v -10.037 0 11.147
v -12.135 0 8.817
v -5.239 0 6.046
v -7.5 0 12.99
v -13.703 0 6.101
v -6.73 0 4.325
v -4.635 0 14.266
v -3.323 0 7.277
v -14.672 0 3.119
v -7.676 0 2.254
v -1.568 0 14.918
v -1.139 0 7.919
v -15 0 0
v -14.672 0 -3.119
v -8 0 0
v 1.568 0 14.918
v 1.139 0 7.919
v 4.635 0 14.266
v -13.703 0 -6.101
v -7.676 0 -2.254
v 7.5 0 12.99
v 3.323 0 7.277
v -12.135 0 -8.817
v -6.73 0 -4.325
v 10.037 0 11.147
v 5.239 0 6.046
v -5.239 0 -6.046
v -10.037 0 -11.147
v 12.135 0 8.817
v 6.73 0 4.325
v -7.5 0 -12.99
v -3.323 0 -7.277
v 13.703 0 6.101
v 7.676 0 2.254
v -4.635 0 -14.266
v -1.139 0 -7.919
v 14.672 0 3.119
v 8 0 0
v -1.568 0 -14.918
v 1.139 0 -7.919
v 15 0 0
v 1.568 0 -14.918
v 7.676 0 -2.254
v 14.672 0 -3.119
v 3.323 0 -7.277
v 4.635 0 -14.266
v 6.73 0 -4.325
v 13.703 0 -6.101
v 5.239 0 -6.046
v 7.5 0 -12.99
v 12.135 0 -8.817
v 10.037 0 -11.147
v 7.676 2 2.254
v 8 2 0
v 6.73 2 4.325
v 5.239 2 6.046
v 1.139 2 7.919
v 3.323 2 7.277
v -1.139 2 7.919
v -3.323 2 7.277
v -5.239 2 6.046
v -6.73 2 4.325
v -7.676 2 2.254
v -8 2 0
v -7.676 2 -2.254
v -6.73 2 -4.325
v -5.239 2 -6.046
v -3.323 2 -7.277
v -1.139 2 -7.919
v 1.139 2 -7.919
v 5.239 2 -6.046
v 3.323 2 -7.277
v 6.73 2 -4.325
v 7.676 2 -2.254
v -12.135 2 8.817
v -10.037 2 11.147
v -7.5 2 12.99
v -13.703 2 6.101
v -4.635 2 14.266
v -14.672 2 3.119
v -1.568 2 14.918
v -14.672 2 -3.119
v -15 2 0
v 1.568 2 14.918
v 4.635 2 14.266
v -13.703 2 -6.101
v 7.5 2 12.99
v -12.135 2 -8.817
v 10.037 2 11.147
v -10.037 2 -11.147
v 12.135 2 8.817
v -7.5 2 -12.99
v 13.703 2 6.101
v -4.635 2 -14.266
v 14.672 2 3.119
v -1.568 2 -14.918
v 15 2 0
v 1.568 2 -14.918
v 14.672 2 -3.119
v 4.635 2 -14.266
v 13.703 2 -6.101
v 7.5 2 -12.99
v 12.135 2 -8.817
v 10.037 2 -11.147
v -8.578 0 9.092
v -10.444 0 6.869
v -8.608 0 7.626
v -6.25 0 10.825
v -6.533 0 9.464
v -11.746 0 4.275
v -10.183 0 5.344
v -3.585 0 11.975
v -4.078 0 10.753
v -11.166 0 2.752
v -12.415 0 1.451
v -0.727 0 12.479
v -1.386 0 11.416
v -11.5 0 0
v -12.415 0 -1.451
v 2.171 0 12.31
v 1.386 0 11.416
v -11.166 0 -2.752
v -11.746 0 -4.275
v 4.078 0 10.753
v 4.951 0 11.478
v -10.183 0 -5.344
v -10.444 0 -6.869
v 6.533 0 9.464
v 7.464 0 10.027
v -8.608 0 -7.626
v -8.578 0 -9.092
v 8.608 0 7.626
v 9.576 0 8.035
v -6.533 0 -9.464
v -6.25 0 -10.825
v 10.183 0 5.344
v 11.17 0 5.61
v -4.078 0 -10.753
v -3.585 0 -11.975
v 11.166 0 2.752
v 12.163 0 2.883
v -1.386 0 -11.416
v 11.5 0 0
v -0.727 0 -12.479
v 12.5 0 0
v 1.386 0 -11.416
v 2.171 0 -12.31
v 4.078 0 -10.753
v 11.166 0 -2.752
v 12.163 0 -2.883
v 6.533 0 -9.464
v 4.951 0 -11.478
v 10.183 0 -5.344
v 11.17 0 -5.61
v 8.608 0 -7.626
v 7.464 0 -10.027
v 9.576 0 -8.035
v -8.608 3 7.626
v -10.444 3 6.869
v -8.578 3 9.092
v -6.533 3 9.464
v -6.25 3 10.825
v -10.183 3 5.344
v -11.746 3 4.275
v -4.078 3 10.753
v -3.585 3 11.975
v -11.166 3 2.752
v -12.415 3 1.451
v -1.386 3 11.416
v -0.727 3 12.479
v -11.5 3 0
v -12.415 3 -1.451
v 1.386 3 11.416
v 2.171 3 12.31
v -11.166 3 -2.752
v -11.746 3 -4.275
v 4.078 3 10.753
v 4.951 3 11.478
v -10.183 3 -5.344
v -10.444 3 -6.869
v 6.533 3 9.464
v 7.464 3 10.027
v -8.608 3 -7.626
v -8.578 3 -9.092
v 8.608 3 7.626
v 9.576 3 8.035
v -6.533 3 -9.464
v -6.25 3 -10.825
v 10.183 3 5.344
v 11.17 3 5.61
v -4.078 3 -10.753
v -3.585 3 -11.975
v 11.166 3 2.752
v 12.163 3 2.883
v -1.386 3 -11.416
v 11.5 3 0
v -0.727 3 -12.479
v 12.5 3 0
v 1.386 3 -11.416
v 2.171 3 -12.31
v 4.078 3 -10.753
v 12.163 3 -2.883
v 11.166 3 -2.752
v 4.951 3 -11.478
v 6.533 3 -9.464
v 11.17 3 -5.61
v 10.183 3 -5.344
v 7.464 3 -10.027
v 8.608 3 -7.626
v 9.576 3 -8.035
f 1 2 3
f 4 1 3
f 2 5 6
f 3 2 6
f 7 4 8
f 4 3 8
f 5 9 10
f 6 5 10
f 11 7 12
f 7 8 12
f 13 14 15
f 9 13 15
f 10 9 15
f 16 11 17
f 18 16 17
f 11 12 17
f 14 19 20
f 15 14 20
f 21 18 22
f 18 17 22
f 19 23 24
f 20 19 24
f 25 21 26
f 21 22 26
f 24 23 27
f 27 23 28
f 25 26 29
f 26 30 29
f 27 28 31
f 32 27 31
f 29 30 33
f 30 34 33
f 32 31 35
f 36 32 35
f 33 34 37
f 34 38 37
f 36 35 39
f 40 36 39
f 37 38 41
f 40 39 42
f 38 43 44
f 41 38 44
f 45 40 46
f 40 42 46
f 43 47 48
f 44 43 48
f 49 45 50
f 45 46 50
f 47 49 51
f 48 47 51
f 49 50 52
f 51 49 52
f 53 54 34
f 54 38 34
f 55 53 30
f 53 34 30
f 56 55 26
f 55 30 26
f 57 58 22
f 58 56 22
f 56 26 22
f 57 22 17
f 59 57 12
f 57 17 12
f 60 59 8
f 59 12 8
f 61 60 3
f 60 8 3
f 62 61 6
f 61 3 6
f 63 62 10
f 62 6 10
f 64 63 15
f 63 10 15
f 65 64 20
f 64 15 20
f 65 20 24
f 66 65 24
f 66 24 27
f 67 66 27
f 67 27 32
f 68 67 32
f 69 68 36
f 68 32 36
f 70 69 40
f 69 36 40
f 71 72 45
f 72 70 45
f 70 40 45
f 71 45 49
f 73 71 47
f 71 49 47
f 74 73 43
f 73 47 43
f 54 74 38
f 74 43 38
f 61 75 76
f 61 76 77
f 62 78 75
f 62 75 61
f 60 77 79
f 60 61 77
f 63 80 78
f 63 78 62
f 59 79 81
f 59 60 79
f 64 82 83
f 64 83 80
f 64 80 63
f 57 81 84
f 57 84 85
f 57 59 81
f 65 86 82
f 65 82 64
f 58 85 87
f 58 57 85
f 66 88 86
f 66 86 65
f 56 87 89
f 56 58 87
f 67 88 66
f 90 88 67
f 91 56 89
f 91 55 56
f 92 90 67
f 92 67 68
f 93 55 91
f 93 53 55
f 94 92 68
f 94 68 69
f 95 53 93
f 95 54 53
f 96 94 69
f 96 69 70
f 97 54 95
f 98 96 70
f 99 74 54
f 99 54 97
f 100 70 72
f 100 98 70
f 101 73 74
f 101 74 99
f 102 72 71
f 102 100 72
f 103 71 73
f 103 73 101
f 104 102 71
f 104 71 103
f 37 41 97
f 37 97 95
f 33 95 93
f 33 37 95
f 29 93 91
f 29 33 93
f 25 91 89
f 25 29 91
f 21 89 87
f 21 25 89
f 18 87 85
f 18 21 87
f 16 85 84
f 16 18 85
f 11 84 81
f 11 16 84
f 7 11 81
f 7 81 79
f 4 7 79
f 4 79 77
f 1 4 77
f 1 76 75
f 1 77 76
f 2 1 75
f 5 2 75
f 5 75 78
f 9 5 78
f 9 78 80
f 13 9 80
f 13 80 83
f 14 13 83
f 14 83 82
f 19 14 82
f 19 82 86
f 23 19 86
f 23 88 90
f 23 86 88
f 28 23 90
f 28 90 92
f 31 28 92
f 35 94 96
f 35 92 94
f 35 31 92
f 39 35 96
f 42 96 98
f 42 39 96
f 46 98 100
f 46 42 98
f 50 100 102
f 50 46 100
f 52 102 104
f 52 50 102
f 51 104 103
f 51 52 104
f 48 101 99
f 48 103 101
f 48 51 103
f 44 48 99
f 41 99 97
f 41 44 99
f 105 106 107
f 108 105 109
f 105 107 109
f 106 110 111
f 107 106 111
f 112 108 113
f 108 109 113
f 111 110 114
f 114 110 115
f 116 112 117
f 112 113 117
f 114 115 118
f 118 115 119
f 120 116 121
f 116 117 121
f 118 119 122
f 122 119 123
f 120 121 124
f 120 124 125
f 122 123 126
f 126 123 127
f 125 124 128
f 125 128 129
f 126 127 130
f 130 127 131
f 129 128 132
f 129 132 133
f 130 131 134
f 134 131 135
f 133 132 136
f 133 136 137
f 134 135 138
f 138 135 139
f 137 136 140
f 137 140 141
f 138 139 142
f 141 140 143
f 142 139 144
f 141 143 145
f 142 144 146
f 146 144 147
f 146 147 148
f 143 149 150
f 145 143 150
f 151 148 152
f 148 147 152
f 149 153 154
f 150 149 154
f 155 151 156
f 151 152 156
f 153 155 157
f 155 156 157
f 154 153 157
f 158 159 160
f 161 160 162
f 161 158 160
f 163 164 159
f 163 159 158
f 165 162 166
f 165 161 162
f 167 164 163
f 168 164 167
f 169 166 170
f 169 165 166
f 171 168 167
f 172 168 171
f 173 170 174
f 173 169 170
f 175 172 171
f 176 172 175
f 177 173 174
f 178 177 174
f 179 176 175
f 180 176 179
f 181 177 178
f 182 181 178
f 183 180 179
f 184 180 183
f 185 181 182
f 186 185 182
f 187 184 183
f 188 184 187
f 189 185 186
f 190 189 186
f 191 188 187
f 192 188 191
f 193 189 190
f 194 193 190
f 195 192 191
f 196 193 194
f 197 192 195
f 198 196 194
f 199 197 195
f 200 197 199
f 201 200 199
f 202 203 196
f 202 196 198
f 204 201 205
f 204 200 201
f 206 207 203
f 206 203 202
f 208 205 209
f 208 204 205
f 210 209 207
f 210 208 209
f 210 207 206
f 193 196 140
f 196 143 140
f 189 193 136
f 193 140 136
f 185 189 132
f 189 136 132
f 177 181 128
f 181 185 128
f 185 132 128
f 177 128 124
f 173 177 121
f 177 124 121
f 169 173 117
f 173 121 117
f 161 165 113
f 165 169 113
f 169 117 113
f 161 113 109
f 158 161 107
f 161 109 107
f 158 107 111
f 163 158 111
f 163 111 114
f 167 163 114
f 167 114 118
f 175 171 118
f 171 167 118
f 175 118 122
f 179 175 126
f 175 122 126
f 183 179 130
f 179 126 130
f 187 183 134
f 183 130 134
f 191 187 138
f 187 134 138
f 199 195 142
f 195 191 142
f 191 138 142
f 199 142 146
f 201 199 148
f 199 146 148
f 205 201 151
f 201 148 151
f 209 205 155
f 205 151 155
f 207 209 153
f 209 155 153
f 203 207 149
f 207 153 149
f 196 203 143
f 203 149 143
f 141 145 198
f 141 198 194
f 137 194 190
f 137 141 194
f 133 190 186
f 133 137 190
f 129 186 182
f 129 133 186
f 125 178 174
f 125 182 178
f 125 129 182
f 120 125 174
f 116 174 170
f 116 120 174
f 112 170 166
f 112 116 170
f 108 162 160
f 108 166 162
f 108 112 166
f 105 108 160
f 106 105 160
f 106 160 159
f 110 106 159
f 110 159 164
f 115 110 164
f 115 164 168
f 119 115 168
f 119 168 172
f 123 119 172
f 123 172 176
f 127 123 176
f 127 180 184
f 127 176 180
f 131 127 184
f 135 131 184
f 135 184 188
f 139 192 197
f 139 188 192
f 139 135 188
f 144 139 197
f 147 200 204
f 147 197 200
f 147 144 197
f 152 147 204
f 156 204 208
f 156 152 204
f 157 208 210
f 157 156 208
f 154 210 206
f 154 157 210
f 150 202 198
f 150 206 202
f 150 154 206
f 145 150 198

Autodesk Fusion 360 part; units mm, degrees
sketch "Sketch1" plane through (0, 0, 0) normal (0, 1, 0) x (1, 0, 0)
  circle A0 centre (0, 0) radius 15
  circle A1 centre (0, 0) radius 8
  circle A2 centre (0, 0) radius 12.5
  circle A3 centre (0, 0) radius 11.5
  dimension "d1" = 30
  dimension "d2" = 16
  dimension "d5" = 25
  dimension "d6" = 23
extrude "Extrude2" add sketch "Sketch1" along normal blind 3 contours A2 makes body 1
extrude "Extrude1" add sketch "Sketch1" along normal blind 2 separate body contours A0 | A2 | A3 makes body 2
